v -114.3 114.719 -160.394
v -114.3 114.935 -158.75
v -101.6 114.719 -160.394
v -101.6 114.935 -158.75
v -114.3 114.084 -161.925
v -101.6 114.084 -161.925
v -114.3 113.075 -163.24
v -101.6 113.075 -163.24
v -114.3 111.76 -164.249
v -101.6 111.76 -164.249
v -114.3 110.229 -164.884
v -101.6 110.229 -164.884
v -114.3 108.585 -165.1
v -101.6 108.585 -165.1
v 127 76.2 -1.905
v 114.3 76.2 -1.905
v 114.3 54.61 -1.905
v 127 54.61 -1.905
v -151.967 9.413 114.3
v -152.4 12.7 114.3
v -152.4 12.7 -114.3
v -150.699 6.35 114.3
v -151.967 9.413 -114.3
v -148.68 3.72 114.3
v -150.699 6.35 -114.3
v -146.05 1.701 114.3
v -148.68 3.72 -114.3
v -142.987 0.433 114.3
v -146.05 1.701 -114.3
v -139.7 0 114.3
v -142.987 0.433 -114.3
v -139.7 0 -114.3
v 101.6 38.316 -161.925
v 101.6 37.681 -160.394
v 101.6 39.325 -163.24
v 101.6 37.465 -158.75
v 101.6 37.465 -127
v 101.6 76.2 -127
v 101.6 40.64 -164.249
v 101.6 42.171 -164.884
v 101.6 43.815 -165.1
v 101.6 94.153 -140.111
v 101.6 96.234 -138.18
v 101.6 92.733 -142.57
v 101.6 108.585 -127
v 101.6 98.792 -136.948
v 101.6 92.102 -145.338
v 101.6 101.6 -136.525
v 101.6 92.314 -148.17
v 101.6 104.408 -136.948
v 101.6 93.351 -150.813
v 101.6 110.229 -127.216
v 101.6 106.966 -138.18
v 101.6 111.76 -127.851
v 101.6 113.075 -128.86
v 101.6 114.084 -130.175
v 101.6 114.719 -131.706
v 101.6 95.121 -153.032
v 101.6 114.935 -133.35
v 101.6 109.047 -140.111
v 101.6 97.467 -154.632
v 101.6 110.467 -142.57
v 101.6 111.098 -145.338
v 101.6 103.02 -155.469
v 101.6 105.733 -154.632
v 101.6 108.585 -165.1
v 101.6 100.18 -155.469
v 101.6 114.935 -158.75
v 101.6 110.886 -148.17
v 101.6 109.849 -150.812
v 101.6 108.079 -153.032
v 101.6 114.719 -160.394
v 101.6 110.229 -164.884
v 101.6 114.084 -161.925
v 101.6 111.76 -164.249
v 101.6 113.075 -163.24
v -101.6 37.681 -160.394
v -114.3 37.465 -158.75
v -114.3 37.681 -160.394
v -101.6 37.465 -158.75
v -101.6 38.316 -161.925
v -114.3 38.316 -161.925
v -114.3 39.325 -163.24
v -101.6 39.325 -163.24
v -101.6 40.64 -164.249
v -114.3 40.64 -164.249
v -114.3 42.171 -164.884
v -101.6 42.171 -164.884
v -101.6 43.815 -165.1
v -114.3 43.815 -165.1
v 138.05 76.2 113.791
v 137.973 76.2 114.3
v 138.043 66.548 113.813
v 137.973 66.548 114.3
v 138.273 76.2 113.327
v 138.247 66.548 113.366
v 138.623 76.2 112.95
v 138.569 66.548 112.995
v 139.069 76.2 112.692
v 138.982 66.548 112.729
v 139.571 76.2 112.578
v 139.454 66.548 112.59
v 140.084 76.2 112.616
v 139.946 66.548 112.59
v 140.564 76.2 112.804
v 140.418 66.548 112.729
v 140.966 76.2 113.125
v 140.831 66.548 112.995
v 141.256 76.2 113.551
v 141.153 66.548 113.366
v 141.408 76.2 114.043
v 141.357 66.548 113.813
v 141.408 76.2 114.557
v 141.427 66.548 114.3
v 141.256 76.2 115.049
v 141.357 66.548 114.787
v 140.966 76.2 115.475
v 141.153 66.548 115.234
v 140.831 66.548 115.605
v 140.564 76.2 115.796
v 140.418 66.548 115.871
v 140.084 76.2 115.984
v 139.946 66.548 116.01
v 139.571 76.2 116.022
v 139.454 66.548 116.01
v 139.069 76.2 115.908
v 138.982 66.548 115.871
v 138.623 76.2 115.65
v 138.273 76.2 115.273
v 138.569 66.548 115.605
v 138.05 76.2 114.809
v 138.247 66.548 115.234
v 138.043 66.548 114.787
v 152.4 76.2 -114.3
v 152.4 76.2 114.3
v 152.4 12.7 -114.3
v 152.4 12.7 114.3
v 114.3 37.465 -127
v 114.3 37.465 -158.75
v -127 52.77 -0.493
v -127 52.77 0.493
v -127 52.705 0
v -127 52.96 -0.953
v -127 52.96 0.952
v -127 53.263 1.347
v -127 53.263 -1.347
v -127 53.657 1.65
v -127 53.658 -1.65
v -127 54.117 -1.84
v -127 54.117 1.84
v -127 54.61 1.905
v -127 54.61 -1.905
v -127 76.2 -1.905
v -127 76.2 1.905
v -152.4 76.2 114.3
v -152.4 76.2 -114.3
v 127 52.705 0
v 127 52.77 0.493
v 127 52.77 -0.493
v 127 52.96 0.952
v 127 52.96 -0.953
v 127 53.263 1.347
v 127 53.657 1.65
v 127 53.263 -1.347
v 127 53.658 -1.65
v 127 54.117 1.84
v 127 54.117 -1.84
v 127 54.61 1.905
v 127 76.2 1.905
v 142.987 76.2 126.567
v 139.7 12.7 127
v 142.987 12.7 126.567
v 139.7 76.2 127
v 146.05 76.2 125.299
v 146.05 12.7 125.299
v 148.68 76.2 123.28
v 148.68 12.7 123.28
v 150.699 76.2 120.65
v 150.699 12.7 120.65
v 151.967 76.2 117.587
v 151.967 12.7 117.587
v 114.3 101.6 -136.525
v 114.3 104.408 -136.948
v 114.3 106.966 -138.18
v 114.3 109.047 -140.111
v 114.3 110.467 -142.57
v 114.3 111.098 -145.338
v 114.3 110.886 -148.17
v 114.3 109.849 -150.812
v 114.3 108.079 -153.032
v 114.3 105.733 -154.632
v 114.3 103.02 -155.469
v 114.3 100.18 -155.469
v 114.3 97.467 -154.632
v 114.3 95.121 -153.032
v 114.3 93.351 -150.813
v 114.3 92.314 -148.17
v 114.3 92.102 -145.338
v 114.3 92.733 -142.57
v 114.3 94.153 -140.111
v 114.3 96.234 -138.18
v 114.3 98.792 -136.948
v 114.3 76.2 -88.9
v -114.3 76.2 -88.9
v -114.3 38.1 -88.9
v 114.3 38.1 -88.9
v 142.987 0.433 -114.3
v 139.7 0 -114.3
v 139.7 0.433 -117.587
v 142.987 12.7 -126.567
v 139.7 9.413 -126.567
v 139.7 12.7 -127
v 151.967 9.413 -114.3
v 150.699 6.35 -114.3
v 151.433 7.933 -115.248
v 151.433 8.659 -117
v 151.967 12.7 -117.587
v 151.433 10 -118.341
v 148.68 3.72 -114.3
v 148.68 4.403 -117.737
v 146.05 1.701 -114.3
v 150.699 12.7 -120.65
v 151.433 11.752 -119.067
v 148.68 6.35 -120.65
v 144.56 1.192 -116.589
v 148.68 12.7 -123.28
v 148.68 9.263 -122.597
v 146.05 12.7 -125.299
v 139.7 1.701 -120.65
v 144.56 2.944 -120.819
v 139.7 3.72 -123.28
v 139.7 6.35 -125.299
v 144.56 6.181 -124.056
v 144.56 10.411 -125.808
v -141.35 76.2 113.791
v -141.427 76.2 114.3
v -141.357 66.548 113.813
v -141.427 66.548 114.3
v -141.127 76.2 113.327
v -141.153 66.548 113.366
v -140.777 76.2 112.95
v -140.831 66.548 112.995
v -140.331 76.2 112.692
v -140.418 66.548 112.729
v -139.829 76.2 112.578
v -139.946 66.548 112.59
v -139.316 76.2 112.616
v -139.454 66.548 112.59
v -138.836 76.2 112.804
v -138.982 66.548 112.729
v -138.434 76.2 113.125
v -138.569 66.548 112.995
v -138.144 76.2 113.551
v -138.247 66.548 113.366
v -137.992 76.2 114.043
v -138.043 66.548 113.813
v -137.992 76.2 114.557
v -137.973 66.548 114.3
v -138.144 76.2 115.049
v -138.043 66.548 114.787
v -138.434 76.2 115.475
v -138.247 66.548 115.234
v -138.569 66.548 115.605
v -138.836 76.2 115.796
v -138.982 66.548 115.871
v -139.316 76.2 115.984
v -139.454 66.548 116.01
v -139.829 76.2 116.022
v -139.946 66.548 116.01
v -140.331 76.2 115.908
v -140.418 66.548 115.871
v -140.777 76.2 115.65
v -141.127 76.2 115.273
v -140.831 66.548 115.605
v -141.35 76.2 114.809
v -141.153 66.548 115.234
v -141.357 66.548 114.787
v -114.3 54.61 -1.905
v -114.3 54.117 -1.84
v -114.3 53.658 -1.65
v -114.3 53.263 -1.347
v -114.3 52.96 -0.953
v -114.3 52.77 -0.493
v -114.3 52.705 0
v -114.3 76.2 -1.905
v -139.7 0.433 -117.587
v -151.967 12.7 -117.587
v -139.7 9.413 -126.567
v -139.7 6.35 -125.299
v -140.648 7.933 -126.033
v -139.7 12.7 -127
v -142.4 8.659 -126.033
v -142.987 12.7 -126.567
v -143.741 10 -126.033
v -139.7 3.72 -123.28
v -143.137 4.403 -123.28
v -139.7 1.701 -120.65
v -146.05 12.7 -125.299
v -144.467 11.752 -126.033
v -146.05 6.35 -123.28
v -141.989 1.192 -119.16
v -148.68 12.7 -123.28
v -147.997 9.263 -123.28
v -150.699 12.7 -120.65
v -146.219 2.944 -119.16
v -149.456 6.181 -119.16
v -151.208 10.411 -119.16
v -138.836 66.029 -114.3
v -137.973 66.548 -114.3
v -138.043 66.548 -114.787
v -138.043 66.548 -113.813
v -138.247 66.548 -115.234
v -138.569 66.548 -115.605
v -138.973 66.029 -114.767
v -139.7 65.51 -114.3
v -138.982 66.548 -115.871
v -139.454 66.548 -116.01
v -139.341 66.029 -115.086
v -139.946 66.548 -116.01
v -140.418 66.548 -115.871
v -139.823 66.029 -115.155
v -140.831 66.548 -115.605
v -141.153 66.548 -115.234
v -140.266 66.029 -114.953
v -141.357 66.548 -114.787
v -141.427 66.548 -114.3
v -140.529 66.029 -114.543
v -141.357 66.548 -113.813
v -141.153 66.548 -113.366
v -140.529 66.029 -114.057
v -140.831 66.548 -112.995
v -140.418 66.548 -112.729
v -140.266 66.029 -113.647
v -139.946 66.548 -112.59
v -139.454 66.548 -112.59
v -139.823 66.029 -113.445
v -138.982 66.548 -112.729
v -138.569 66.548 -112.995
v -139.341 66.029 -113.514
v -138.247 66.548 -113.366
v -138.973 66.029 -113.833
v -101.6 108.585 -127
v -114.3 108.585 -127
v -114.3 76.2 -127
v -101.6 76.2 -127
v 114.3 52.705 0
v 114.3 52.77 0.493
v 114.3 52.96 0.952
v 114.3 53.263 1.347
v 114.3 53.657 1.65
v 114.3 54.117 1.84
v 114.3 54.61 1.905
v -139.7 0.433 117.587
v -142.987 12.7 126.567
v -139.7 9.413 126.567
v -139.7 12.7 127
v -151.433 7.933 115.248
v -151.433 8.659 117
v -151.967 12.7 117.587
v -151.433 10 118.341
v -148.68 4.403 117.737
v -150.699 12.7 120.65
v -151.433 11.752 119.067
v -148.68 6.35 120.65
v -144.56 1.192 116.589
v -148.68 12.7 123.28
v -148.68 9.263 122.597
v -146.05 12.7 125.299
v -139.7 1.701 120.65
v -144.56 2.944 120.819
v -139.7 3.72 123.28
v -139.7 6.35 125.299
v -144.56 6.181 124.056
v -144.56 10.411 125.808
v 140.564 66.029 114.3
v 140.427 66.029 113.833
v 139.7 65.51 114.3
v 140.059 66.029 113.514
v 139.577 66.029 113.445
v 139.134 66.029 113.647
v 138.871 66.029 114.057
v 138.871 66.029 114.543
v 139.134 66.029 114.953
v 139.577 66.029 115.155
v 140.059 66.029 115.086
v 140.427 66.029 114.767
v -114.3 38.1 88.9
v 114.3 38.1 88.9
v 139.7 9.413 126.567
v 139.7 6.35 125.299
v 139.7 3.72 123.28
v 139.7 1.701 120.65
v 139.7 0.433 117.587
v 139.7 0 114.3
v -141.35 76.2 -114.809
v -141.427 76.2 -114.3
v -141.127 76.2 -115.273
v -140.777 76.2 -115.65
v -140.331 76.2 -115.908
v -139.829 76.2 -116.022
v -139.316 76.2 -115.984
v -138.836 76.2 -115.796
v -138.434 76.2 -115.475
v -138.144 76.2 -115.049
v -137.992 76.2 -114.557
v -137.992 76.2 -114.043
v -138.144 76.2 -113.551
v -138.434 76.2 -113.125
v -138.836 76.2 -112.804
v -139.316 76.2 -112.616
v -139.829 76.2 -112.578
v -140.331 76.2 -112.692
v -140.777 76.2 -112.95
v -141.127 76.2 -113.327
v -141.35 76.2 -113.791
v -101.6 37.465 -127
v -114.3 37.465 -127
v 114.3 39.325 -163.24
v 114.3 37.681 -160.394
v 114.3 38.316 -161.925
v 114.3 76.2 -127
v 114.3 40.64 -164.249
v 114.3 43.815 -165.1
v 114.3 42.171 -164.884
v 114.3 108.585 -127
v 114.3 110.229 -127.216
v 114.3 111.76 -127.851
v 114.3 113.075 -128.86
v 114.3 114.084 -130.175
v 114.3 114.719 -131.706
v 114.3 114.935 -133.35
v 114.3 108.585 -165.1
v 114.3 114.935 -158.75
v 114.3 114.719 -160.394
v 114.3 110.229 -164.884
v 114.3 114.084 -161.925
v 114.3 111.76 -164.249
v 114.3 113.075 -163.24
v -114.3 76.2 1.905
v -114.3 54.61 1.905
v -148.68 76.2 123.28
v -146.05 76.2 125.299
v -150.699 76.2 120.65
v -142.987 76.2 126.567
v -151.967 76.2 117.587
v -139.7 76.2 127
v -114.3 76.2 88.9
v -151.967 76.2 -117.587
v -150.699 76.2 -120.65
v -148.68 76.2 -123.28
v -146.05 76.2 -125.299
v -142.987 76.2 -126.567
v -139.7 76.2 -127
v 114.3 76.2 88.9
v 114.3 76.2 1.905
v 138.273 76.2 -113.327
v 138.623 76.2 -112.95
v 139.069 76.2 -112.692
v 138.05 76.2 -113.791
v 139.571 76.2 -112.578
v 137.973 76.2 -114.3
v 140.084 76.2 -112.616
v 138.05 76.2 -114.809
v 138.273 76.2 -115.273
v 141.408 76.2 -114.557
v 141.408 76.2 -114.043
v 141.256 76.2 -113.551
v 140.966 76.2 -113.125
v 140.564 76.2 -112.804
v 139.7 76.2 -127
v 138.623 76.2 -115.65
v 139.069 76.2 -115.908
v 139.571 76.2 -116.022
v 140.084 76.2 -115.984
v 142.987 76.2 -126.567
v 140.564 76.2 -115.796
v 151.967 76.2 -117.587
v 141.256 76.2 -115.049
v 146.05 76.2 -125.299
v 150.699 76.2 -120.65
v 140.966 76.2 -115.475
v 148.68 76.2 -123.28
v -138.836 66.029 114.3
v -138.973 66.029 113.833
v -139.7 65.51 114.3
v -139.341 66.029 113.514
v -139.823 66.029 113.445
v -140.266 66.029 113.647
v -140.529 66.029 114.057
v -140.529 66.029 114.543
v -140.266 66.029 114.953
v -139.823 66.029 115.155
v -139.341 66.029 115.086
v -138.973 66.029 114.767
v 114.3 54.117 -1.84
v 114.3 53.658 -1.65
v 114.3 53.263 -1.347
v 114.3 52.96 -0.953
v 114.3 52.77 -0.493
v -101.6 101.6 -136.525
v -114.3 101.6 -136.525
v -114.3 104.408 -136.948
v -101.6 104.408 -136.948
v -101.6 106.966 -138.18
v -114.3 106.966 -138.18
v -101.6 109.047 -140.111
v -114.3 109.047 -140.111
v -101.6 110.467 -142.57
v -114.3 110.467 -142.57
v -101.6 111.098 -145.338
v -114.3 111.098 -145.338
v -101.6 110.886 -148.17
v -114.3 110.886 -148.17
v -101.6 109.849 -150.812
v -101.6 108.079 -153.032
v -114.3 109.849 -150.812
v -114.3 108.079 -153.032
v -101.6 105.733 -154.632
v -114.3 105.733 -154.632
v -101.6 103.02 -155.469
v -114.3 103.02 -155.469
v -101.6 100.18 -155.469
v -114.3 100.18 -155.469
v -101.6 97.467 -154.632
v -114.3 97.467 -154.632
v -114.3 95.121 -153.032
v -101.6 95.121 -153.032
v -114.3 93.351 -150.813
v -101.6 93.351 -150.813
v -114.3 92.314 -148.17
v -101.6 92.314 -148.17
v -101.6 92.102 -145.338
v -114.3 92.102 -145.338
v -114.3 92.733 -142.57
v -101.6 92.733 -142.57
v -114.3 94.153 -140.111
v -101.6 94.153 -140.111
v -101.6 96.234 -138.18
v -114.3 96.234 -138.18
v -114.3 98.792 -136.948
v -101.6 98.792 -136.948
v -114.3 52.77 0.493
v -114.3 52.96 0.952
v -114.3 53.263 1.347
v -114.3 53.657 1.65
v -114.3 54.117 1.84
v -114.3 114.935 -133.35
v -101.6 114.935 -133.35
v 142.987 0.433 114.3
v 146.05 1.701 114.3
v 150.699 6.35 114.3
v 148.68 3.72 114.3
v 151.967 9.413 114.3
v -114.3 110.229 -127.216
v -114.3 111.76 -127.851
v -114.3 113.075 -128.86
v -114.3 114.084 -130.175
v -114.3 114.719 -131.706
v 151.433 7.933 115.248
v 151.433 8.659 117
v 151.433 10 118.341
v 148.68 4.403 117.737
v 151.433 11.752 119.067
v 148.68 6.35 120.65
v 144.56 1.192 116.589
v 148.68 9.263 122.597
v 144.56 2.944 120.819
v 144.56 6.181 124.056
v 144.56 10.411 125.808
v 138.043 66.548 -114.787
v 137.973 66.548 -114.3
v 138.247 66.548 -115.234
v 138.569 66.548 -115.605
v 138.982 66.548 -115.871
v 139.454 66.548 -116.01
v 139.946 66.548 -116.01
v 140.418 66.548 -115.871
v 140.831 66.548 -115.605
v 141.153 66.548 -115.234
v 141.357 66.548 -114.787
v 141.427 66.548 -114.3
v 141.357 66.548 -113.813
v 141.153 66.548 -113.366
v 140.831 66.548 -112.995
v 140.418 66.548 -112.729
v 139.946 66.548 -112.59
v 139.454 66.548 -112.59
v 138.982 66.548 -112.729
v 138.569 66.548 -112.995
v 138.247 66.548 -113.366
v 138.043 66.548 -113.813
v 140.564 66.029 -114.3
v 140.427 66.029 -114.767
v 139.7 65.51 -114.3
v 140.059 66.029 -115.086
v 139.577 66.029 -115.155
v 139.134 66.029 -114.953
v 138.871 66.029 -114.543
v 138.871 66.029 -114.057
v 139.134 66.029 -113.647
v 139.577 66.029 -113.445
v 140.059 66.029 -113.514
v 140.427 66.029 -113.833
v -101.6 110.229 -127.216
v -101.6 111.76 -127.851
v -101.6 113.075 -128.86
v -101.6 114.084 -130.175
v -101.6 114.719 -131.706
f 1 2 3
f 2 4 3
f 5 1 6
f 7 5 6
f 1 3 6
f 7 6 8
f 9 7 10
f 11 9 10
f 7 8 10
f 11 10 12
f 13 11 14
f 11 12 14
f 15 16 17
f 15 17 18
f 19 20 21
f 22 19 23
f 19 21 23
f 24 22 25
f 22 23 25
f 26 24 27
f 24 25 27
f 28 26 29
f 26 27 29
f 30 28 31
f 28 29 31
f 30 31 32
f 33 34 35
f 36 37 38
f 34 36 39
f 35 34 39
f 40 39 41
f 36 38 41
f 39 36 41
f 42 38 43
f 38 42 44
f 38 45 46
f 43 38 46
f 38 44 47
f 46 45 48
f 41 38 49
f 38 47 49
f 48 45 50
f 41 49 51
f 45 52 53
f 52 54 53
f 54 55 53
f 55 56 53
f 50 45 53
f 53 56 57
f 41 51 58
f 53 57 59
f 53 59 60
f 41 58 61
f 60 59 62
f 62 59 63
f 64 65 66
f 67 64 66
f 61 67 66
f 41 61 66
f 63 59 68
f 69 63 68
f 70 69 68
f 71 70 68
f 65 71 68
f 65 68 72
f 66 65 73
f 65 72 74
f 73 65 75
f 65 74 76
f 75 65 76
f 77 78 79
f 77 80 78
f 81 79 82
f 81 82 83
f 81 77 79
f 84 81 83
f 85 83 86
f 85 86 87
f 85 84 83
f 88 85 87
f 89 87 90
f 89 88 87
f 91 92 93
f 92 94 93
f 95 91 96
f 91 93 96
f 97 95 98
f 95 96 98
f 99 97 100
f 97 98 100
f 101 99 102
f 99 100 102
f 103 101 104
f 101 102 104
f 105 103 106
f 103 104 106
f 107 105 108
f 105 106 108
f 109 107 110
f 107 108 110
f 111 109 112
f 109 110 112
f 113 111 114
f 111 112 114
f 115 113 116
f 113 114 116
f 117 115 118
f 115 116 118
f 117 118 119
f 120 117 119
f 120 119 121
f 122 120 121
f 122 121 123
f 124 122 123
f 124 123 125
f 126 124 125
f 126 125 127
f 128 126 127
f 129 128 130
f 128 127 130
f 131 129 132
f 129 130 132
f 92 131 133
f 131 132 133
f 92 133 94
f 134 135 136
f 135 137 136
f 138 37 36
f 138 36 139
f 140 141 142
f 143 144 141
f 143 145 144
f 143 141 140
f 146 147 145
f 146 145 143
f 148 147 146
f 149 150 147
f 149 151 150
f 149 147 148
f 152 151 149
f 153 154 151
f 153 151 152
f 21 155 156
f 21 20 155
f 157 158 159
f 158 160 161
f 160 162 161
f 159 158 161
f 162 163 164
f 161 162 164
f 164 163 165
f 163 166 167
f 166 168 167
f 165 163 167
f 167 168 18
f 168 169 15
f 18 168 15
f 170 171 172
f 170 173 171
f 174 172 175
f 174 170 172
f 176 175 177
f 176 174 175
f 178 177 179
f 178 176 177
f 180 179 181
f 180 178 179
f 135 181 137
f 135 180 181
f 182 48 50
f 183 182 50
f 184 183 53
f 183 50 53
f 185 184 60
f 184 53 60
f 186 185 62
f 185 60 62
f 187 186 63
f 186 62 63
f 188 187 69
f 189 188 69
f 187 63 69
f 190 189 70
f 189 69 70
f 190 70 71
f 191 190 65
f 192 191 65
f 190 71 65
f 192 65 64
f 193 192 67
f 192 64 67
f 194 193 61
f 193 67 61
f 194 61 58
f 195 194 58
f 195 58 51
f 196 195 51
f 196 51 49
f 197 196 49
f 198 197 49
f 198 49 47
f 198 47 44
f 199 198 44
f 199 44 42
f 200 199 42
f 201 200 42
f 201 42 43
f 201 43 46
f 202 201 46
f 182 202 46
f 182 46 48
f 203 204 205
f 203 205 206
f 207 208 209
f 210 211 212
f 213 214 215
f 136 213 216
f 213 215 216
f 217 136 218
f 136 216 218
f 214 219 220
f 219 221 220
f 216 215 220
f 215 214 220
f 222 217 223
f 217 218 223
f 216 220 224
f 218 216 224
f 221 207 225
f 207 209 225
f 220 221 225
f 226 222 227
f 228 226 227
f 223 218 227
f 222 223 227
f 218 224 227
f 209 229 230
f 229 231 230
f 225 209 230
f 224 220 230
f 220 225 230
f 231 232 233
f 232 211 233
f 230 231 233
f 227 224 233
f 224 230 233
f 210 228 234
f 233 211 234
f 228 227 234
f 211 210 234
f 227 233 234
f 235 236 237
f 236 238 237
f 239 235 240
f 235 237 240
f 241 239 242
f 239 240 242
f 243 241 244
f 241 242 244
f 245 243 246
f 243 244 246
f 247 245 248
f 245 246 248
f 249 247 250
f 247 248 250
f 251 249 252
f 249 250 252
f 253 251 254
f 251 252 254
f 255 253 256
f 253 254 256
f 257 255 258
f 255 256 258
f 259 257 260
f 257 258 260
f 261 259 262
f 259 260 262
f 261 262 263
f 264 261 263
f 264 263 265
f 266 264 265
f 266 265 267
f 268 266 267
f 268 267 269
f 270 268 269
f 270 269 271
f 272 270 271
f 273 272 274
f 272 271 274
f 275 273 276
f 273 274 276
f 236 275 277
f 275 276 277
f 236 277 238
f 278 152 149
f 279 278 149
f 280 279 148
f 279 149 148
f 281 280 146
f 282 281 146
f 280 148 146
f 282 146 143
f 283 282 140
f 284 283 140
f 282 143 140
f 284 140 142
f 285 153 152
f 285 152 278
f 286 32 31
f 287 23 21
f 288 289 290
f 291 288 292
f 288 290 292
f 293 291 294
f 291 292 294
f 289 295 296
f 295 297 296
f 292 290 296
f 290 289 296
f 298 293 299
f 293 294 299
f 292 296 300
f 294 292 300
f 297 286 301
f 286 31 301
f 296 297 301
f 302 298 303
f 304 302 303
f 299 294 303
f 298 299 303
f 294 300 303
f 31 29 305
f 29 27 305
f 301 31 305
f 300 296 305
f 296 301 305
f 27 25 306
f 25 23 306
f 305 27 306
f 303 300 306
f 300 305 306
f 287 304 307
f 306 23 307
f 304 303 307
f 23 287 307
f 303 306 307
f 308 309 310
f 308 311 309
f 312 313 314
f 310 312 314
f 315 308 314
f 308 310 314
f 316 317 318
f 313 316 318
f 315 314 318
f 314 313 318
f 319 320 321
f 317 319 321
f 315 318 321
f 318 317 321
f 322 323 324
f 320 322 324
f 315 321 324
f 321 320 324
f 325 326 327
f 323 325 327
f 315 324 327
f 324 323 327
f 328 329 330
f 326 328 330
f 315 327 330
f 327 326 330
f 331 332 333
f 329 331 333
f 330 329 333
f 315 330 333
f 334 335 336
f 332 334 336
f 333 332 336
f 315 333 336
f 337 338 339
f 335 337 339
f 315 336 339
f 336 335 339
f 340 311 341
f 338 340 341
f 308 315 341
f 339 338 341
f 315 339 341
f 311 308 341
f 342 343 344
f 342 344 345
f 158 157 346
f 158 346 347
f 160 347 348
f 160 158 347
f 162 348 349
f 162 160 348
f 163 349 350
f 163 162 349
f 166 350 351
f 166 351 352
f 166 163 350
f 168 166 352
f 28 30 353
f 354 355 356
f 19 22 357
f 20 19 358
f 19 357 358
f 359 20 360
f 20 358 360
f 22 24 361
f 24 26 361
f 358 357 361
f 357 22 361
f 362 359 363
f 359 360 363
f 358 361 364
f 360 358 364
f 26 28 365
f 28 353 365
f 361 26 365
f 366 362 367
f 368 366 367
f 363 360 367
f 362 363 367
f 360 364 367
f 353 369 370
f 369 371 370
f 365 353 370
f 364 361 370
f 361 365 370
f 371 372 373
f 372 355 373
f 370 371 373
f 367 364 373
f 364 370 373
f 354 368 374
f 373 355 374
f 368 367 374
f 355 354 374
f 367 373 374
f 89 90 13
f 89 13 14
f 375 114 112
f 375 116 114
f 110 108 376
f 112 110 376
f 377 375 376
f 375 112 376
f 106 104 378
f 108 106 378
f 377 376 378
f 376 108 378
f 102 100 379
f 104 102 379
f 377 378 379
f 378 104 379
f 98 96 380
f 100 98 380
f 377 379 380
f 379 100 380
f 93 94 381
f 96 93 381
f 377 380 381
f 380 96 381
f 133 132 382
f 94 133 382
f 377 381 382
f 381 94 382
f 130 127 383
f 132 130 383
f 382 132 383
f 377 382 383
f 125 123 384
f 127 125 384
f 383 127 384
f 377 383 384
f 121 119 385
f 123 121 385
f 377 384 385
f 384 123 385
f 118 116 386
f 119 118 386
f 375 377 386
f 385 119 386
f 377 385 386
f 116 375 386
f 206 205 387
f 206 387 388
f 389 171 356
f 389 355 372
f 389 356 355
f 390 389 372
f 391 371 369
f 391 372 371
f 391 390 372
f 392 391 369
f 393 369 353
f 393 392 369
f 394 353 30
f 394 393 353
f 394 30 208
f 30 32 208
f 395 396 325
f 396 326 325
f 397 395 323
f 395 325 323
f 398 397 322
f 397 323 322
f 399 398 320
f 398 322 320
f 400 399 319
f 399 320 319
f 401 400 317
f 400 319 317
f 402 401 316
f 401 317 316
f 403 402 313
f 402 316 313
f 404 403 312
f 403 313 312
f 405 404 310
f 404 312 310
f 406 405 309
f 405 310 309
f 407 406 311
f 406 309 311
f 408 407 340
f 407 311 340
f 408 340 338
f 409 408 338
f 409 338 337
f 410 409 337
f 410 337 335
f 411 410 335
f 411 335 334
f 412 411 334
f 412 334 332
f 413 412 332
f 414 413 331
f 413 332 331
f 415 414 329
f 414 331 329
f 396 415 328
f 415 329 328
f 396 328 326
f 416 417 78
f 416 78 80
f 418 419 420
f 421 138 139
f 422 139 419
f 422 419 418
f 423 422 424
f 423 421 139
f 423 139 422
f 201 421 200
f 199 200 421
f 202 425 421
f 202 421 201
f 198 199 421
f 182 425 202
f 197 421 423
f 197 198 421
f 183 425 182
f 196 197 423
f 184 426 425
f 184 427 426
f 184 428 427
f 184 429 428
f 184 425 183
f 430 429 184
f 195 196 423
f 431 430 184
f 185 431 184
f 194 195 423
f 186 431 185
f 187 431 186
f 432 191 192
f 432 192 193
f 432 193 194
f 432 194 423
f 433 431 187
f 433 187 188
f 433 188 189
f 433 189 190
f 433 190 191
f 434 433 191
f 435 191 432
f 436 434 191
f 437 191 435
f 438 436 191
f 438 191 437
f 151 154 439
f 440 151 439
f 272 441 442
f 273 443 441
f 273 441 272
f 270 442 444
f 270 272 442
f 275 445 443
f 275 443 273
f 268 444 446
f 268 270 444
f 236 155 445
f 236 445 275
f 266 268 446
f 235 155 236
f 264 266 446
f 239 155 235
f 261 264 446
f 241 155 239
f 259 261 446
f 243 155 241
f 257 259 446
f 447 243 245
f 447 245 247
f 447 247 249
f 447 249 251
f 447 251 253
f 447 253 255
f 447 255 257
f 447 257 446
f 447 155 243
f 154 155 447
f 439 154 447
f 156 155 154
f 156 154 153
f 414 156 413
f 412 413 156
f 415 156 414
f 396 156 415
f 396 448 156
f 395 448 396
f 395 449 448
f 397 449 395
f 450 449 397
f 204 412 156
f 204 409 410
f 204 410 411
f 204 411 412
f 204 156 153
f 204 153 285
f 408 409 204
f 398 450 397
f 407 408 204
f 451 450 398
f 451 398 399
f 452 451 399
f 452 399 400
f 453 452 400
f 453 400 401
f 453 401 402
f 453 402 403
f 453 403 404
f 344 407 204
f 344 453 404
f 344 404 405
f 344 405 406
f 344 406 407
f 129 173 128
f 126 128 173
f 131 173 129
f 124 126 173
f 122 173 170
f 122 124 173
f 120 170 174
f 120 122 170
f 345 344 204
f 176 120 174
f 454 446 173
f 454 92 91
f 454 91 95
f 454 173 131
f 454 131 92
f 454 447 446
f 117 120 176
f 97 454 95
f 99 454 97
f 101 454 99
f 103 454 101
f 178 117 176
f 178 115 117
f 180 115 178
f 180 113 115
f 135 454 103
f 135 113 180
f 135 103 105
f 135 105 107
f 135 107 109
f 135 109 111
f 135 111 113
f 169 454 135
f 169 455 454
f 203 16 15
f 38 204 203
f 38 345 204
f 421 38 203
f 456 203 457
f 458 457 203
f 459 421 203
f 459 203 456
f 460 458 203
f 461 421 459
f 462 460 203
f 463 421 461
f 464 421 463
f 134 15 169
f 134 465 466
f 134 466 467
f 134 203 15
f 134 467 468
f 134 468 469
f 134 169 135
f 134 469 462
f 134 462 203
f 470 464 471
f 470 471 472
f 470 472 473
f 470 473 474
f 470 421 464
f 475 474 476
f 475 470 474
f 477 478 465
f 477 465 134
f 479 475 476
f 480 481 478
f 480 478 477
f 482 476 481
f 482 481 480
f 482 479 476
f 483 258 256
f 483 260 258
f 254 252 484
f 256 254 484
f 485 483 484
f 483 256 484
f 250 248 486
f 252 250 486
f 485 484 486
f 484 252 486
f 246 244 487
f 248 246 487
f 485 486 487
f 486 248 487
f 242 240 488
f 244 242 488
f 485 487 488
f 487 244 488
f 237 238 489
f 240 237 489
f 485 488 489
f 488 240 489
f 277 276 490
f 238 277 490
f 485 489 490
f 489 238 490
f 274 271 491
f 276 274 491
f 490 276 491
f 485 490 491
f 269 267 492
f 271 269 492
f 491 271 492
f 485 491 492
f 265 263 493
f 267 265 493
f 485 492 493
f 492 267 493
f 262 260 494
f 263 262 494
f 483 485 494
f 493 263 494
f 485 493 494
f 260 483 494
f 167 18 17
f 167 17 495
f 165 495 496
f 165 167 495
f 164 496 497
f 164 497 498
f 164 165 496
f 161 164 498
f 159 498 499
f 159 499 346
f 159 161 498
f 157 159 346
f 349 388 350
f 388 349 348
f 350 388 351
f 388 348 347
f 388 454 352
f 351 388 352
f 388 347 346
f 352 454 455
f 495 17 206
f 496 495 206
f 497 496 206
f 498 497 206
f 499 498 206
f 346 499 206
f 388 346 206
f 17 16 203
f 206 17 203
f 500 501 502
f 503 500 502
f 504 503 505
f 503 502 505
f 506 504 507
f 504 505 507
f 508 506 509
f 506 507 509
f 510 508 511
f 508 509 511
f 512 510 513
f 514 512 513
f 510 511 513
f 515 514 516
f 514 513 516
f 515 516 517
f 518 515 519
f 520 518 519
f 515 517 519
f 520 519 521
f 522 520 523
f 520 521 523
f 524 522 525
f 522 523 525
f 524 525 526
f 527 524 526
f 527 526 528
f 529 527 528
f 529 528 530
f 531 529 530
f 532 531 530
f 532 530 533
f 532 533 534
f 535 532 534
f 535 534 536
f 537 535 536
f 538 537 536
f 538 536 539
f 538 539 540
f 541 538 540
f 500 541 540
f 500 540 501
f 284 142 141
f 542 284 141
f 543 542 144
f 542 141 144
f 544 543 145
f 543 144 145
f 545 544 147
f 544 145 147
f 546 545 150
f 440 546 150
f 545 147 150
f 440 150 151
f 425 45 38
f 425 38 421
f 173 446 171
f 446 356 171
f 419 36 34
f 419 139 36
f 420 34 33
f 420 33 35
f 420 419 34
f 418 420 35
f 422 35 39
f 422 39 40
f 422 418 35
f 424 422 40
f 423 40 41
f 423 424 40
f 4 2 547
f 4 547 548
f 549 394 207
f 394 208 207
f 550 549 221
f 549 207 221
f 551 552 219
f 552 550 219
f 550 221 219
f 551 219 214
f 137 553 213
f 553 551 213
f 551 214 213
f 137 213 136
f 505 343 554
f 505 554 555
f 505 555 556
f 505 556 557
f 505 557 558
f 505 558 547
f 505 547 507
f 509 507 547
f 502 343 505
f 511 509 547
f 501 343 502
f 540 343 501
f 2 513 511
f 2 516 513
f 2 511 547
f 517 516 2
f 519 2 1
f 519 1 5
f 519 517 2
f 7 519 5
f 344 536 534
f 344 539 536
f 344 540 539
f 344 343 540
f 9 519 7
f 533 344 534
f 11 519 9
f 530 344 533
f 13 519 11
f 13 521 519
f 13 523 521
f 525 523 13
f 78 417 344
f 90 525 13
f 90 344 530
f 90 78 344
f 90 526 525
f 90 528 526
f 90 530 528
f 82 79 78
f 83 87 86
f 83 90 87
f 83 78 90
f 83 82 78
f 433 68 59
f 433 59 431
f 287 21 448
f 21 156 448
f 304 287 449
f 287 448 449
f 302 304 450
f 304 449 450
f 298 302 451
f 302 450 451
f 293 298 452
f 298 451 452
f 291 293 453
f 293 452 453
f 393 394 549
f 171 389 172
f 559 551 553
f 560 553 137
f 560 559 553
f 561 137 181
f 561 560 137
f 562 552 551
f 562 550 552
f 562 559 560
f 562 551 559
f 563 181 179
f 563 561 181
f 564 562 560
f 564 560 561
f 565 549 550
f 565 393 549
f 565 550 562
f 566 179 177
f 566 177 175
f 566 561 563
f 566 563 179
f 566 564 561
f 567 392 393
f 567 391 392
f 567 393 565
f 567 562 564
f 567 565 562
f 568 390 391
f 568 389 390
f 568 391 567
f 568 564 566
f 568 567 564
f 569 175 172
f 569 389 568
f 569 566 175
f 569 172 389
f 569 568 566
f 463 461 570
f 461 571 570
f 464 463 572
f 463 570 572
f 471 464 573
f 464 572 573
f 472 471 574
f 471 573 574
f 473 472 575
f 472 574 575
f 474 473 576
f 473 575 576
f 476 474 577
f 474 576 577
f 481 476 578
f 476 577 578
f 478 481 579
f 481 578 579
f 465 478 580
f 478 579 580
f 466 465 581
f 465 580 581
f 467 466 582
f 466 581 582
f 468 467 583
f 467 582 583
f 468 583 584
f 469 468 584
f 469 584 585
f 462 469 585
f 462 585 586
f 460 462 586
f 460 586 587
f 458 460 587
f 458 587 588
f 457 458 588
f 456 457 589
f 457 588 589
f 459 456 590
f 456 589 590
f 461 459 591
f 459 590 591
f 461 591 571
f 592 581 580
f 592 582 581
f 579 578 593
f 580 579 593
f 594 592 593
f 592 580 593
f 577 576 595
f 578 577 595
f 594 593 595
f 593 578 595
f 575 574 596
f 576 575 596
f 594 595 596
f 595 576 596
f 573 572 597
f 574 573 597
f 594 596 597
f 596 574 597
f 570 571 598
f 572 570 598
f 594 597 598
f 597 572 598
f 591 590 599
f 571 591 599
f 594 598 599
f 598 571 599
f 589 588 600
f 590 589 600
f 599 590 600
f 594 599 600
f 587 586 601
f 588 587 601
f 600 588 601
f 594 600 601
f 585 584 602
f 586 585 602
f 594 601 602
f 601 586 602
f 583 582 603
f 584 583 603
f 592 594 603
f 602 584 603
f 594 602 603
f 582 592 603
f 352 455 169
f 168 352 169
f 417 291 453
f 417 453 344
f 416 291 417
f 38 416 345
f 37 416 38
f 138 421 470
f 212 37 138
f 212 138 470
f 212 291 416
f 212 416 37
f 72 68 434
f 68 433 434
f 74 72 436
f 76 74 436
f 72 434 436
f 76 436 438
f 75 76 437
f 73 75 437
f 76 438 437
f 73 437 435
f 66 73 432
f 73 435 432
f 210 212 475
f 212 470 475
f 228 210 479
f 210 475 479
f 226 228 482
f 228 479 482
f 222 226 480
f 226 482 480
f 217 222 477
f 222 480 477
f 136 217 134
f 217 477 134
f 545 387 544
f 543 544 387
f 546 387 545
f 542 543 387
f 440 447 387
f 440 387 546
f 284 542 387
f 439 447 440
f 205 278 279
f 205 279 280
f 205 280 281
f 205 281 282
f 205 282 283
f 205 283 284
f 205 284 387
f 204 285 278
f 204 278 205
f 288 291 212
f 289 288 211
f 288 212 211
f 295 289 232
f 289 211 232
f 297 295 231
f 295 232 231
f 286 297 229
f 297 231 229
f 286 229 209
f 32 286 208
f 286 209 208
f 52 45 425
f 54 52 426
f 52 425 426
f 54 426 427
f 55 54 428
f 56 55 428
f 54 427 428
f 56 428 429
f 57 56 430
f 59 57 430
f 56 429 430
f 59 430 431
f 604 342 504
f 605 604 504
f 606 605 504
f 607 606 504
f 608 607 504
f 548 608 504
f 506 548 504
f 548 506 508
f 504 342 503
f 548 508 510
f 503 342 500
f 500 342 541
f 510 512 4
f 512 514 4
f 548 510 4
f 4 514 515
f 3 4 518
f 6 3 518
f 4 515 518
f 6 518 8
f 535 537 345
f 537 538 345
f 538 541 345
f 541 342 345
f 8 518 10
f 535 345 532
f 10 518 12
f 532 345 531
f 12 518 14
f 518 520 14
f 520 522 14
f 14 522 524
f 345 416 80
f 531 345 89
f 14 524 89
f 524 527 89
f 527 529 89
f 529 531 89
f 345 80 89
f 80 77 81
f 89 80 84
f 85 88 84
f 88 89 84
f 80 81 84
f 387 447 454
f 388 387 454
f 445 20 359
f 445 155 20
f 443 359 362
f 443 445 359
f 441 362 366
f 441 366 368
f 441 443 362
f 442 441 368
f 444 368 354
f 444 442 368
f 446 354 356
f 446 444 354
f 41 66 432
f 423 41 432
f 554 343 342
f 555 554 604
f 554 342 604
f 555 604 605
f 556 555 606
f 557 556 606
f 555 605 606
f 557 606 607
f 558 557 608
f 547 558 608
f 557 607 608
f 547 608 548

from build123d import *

# Parameters (mm, degrees)
SKETCH4_W                 = 304.8
SKETCH4_H                 = 254
BOSS_EXTRUDE1_DEPTH       = 76.2
SKETCH5_W                 = 228.6
SKETCH5_H                 = 177.8
CUT_EXTRUDE1_DEPTH        = 38.1
FILLET1_R                 = 12.7
SKETCH11_W                = 12.7
SKETCH11_H                = 38.1
BOSS_EXTRUDE2_DEPTH       = 38.735
SKETCH12_R                = 9.525
CUT_EXTRUDE4_DEPTH        = 267.7
FILLET3_R                 = 6.35
SKETCH13_W                = 254
SKETCH13_H                = 3.81
CUT_EXTRUDE5_DEPTH        = 23.495
BOSS_EXTRUDE3_DEPTH       = 12.7
FILLET5_R                 = 6.35
F_8_32_TAPPED_HOLE1_D     = 3.4544
F_8_32_TAPPED_HOLE1_DEPTH = 9.652
F_8_32_TAPPED_HOLE1_TIP   = 1.037806461


with BuildPart() as part:
    # Sketch4 → Boss-Extrude1 (new body)
    with BuildSketch(Plane(origin=(0, 0, 0), x_dir=(1, 0, 0), z_dir=(0, 1, 0))):
        Rectangle(SKETCH4_W, SKETCH4_H)
    extrude(amount=BOSS_EXTRUDE1_DEPTH)

    # Sketch5 → Cut-Extrude1 (cut)
    with BuildSketch(Plane(origin=(0, 76.2, 0), x_dir=(1, 0, 0), z_dir=(0, 1, 0))):
        Rectangle(SKETCH5_W, SKETCH5_H)
    extrude(amount=-CUT_EXTRUDE1_DEPTH, mode=Mode.SUBTRACT)

    # Fillet1
    fillet1_edges = [part.edges().sort_by_distance(p)[0] for p in [
        (0, 0, 127),
        (-152.4, 0, 0),
        (0, 0, -127),
        (152.4, 0, 0),
        (152.4, 38.1, 127),
        (-152.4, 38.1, 127),
        (-152.4, 38.1, -127),
        (152.4, 38.1, -127),
    ]]
    fillet(fillet1_edges, radius=FILLET1_R)

    # Sketch11 → Boss-Extrude2 (add, symmetric)
    with BuildSketch(Plane(origin=(0, 76.2, 0), x_dir=(1, 0, 0), z_dir=(0, 1, 0))):
        with Locations((-107.95, 146.05)):
            Rectangle(SKETCH11_W, SKETCH11_H)
        with Locations((107.95, 146.05)):
            Rectangle(SKETCH11_W, SKETCH11_H)
    extrude(amount=BOSS_EXTRUDE2_DEPTH, both=True)

    # Sketch12 → Cut-Extrude4 (cut, through all)
    with BuildSketch(Plane.ZY.offset(114.3)):
        with Locations((-146.05, 101.6)):
            Circle(SKETCH12_R)
    extrude(amount=-CUT_EXTRUDE4_DEPTH, mode=Mode.SUBTRACT)

    # Fillet3
    fillet3_edges = [part.edges().sort_by_distance(p)[0] for p in [
        (-107.95, 114.935, -127),
        (107.95, 114.935, -127),
    ]]
    fillet(fillet3_edges, radius=FILLET3_R)

    # Sketch13 → Cut-Extrude5 (cut)
    with BuildSketch(Plane(origin=(0, 76.2, 0), x_dir=(1, 0, 0), z_dir=(0, 1, 0))):
        Rectangle(SKETCH13_W, SKETCH13_H)
    extrude(amount=-CUT_EXTRUDE5_DEPTH, mode=Mode.SUBTRACT)

    # Sketch18 → Boss-Extrude3 (add)
    with BuildSketch(Plane(origin=(-127, 0, 0), x_dir=(0, 0, -1), z_dir=(1, 0, 0))):
        with BuildLine():
            Line((-1.905, 52.705), (1.3e-08, 52.705))
            ThreePointArc((1.3e-08, 52.705), (-1.347038413, 53.262961577), (-1.905, 54.61))
            Line((-1.905, 54.61), (-1.905, 52.705))
        make_face()
        with BuildLine():
            Line((1.905, 52.705), (1.905, 54.61))
            ThreePointArc((1.905, 54.61), (1.347038423, 53.262961587), (1.3e-08, 52.705))
            Line((1.3e-08, 52.705), (1.905, 52.705))
        make_face()
    boss_extrude3 = extrude(amount=BOSS_EXTRUDE3_DEPTH)

    # Mirror1: Boss-Extrude3 across plane
    add(boss_extrude3.mirror(Plane(origin=(0, 0, 0), x_dir=(0, 0, 1), z_dir=(1, 0, 0))))

    # Fillet5
    fillet5_edges = [part.edges().sort_by_distance(p)[0] for p in [
        (-107.95, 37.465, -165.1),
        (-107.95, 114.935, -165.1),
        (107.95, 37.465, -165.1),
        (107.95, 114.935, -165.1),
    ]]
    fillet(fillet5_edges, radius=FILLET5_R)

    # #8-32 Tapped Hole1
    with Locations(Plane(origin=(0, 76.2, 0), x_dir=(1, 0, 0), z_dir=(0, 1, 0))):
        with Locations((-139.7, -114.3), (-139.7, 114.3), (139.7, 114.3), (139.7, -114.3)):
            Hole(F_8_32_TAPPED_HOLE1_D / 2, depth=F_8_32_TAPPED_HOLE1_DEPTH)
            with Locations((0, 0, -(F_8_32_TAPPED_HOLE1_DEPTH + F_8_32_TAPPED_HOLE1_TIP / 2))):  # 118° drill point
                Cone(0, F_8_32_TAPPED_HOLE1_D / 2, F_8_32_TAPPED_HOLE1_TIP, mode=Mode.SUBTRACT)


solid = part.part
